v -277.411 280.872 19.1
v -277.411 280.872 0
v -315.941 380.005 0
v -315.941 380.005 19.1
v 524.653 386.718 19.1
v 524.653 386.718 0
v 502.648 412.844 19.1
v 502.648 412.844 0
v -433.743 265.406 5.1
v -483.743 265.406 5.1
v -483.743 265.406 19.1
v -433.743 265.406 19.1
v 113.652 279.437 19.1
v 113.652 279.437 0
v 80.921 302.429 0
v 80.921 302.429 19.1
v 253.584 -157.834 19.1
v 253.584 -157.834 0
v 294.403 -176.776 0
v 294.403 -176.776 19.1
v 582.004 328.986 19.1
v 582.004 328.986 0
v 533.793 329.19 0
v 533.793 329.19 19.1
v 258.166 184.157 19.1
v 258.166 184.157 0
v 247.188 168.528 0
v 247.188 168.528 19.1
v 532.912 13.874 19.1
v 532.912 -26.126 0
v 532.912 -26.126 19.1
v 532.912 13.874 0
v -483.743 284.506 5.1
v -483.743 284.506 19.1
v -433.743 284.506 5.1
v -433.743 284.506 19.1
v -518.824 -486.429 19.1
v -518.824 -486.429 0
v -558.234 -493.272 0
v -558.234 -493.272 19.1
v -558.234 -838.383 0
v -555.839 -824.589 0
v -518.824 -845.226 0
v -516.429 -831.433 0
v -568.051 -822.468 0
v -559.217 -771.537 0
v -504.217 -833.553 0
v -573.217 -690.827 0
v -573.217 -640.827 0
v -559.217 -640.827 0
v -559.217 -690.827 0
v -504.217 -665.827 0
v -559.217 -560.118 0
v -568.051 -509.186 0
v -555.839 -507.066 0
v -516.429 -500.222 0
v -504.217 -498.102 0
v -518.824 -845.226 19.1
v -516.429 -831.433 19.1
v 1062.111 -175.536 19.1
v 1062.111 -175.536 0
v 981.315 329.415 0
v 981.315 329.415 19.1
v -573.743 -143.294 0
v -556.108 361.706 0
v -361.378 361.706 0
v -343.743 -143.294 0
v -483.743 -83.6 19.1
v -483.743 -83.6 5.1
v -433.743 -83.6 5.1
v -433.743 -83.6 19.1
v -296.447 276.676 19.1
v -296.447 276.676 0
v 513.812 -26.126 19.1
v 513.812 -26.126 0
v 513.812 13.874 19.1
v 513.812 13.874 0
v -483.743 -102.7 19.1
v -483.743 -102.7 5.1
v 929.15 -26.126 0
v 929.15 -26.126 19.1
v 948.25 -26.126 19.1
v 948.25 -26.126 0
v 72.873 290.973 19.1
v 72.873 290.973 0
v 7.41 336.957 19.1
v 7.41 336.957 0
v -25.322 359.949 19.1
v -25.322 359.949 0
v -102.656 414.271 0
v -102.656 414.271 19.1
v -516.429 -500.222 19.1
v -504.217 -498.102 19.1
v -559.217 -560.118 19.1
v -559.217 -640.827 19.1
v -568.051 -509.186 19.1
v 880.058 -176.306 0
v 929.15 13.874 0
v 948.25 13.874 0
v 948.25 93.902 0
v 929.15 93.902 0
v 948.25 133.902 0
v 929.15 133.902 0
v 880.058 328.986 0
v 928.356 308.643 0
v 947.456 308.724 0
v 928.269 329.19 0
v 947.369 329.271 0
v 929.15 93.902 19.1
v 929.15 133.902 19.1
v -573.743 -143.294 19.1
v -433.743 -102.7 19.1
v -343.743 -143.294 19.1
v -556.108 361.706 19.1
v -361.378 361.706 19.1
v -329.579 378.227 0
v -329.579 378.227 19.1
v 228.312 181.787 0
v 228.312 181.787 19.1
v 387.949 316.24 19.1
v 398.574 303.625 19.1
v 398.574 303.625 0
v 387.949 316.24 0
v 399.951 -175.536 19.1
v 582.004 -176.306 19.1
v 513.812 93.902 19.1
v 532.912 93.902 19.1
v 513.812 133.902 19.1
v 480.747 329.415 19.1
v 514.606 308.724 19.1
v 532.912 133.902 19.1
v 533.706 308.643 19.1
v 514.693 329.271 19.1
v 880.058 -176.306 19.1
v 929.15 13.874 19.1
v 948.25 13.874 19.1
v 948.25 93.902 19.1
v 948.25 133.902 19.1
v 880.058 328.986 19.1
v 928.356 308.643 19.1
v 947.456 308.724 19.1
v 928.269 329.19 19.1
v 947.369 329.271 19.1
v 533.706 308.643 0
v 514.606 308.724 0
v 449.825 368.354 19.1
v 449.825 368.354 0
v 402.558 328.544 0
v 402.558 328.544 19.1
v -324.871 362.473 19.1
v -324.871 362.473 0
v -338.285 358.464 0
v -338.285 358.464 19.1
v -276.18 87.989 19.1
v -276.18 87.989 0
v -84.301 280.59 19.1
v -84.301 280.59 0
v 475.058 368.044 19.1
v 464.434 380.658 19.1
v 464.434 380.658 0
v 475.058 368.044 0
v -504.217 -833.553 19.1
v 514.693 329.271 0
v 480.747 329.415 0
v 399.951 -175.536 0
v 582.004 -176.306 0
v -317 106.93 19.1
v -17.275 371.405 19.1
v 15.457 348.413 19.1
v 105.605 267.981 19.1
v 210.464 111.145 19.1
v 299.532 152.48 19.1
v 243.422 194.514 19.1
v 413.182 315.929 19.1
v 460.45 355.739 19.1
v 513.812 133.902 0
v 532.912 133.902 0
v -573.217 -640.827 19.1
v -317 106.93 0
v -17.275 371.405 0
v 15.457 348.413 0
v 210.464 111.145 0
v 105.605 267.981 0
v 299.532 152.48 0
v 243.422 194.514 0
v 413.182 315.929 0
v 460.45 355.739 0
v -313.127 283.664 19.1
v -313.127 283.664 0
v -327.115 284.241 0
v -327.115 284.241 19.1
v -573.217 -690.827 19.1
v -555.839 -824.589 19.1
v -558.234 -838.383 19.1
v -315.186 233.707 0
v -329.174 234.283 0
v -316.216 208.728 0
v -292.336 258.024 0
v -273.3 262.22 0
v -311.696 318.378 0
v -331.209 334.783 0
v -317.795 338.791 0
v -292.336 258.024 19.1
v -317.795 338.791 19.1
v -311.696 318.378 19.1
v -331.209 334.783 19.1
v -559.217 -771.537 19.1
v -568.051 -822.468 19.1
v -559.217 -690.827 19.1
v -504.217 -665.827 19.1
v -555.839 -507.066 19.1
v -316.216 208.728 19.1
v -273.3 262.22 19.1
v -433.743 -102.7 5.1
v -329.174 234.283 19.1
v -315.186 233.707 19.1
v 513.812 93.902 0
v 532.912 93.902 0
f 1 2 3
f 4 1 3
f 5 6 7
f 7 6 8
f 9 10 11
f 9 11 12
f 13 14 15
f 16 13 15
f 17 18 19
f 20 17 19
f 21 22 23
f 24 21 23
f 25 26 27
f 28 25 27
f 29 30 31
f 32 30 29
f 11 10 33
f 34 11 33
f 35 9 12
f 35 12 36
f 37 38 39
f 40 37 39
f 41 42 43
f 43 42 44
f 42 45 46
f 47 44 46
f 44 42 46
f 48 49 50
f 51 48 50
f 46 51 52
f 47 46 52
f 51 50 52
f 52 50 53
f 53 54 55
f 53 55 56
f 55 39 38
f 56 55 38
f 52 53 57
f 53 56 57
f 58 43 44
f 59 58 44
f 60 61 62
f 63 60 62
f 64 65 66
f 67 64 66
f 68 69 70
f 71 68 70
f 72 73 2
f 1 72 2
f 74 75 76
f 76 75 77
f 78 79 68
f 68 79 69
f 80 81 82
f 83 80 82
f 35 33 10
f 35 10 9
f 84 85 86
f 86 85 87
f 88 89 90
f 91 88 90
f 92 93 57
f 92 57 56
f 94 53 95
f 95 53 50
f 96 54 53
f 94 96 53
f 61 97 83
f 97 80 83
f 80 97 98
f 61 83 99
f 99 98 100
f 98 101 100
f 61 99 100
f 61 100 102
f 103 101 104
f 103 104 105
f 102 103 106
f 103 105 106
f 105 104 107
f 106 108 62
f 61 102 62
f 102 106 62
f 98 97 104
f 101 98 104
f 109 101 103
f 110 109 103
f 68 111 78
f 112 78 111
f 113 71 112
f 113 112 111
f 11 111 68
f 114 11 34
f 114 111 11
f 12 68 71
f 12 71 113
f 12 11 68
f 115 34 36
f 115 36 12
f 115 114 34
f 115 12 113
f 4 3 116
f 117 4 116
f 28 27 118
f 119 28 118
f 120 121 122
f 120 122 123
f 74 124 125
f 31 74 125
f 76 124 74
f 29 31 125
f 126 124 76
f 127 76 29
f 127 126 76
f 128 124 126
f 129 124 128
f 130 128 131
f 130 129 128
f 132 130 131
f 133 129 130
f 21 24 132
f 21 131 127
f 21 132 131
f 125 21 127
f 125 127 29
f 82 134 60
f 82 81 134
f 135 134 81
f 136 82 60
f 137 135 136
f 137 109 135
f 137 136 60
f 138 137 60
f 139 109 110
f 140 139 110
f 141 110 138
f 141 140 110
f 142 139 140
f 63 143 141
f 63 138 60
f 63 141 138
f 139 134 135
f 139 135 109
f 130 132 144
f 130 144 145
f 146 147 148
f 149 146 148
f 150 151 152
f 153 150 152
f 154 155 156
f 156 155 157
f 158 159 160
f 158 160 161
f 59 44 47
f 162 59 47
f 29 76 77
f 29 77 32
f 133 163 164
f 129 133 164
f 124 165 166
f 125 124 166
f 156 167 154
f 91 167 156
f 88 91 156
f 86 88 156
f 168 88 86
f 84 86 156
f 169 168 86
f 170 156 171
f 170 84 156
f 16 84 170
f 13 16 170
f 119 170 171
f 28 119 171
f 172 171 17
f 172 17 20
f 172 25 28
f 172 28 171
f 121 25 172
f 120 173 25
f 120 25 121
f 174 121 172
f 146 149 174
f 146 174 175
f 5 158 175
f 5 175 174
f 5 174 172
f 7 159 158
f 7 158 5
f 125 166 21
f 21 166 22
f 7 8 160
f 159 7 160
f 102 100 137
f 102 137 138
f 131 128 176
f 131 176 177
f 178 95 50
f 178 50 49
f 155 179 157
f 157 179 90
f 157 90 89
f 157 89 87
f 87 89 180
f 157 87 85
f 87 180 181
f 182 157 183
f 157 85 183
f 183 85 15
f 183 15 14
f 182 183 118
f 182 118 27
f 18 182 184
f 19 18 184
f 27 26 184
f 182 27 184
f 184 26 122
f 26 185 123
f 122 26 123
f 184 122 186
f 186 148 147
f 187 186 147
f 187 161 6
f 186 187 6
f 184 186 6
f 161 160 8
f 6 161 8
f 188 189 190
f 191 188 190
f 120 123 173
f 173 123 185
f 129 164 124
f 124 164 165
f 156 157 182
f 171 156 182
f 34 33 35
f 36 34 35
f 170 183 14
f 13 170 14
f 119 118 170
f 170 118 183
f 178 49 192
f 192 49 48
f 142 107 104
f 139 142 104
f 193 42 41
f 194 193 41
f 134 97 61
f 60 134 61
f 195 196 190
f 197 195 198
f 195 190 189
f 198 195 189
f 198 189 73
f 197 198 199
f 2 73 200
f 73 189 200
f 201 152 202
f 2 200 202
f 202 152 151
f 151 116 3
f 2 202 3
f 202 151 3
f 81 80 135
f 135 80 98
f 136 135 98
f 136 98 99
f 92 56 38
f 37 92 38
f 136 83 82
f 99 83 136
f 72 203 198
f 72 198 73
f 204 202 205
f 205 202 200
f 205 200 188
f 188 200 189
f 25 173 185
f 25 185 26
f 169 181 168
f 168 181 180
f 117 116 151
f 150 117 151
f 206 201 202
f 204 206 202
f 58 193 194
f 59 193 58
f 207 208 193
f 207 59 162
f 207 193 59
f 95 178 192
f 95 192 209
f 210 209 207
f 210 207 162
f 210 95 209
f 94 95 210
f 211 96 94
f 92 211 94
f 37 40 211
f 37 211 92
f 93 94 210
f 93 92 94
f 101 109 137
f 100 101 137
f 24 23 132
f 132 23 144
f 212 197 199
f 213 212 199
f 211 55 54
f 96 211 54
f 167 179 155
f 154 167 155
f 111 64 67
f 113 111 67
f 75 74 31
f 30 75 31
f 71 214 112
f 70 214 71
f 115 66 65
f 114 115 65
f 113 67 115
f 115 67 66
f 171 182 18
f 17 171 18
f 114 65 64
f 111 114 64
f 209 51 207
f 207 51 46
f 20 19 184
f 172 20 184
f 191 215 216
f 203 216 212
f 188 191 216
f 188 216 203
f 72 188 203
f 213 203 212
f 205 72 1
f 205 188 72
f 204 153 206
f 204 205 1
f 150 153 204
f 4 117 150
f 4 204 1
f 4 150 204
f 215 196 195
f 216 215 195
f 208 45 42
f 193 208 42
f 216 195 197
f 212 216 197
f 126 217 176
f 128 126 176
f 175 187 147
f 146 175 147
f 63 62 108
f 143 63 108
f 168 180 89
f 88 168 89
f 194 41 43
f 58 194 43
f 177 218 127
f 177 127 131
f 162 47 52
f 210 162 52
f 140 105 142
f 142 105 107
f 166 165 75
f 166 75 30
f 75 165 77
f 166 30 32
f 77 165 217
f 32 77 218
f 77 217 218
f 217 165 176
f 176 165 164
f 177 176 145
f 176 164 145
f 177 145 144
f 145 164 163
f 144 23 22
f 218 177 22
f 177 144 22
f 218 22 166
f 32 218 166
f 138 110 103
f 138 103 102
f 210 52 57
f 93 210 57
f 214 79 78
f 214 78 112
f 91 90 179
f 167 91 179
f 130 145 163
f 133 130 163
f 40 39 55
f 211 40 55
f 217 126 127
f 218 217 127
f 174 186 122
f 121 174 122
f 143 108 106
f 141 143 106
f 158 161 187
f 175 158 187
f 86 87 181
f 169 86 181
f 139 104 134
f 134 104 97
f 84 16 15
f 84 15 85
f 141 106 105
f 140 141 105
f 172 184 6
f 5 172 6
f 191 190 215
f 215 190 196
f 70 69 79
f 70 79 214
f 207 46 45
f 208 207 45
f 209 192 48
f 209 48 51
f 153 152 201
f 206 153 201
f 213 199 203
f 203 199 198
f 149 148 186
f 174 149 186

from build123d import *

# Parameters (mm, degrees)
F8_DEPTH  = 19.1
F5_W      = 50
F5_H      = 19.1
F9_DEPTH  = 19.1
F10_DEPTH = 5.1
F7_W      = 19.1
F7_H      = 40
F11_DEPTH = 19.1
F12_DEPTH = 19.1
F13_DEPTH = 19.1
F14_DEPTH = 19.1


with BuildPart() as f8:
    # F4 (on Top) → F8 (new body)
    with BuildSketch(Plane.XY):
        Polygon((-313.1266277774, 283.6644104903), (-327.1147646324, 284.2410020329), (-329.1741094881, 234.2834420546), (-315.1859736966, 233.7068247119), (-316.2156467329, 208.7280299609), (-273.3003869716, 262.2195143856), (-292.3363522535, 258.0239884914), (-296.4473277028, 276.6763309864), (-277.4113714695, 280.8718979359), (-315.9410263327, 380.0053418764), (-329.5787654228, 378.2274162112), (-324.8712113565, 362.4725983647), (-338.2852128724, 358.4644823715), (-331.2090634127, 334.7826628481), (-317.7950618968, 338.7907788413), (-311.6956915548, 318.3779556716), align=None)
    extrude(amount=F8_DEPTH)


with BuildPart() as f9:
    # F5 (on Top) → F9 (new body)
    with BuildSketch(Plane.XY):
        Polygon((-361.3780457647, 361.7061713082), (-556.1080685776, 361.7061713082), (-573.7430571711, -143.2938286987), (-343.7430571711, -143.2938286987), align=None)
        with Locations((-458.7430571711, -93.149946513)):
            Rectangle(F5_W, F5_H, mode=Mode.SUBTRACT)
        with Locations((-458.7430571711, 274.9561713082)):
            Rectangle(F5_W, F5_H, mode=Mode.SUBTRACT)
    extrude(amount=F9_DEPTH)

    # F5 (on Top) → F10 (join)
    with BuildSketch(Plane.XY):
        with Locations((-458.7430571711, 274.9561713082)):
            Rectangle(F5_W, F5_H)
        with Locations((-458.7430571711, -93.149946513)):
            Rectangle(F5_W, F5_H)
    extrude(amount=F10_DEPTH)


with BuildPart() as f11:
    # F7 (on Top) → F11 (new body)
    with BuildSketch(Plane.XY):
        Polygon((582.0035287882, -176.3063819392), (582.0035287882, 328.9861993314), (533.7929346044, 329.1903235698), (533.7059359161, 308.6427468278), (514.6061071153, 308.7236157337), (514.6931058036, 329.2711924758), (480.7467333972, 329.4149218268), (399.951019882, -175.5355694162), align=None)
        with Locations((523.362160485, -6.1262955917)):
            Rectangle(F7_W, F7_H, mode=Mode.SUBTRACT)
        with Locations((523.362160485, 113.9023802395)):
            Rectangle(F7_W, F7_H, mode=Mode.SUBTRACT)
    extrude(amount=F11_DEPTH)


with BuildPart() as f12:
    # F7 (on Top) → F12 (new body)
    with BuildSketch(Plane.XY):
        Polygon((947.4556556945, 308.7236157337), (928.3558268936, 308.6427468278), (928.2688282054, 329.1903235698), (880.0582340215, 328.9861993314), (880.0582340215, -176.3063819392), (1062.1107429277, -175.5355694162), (981.3150294126, 329.4149218268), (947.3686570062, 329.2711924758), align=None)
        with Locations((938.6996023248, -6.1262955917)):
            Rectangle(F7_W, F7_H, mode=Mode.SUBTRACT)
        with Locations((938.6996023248, 113.9023802395)):
            Rectangle(F7_W, F7_H, mode=Mode.SUBTRACT)
    extrude(amount=F12_DEPTH)


with BuildPart() as f13:
    # F6 (on Top) → F13 (new body)
    with BuildSketch(Plane.XY):
        Polygon((-102.6559747542, 414.2710963537), (-316.9997298591, 106.9301511755), (-276.1802506404, 87.988923224), (-84.3006384796, 280.5902925922), (210.4639827755, 111.1448463205), (253.5838772676, -157.834475293), (294.4033564863, -176.7757032445), (299.5322804337, 152.4799536751), (524.6525175935, 386.7178821382), (502.648378277, 412.8437198576), (464.4339913585, 380.6581607692), (475.0584816431, 368.0435474443), (460.4496238611, 355.7394312914), (449.8251335765, 368.3540446163), (402.5579608011, 328.5438970522), (413.1824510857, 315.9292837272), (398.5735933037, 303.6251675743), (387.9491030191, 316.2397808993), (243.4223633701, 194.5140567959), (258.1663649741, 184.1573221161), (247.1876840831, 168.5279086309), (228.3115703971, 181.7871924047), (105.6050950916, 267.9807809809), (113.6522957447, 279.4368955775), (80.9205397546, 302.4288974434), (72.8733391015, 290.9727828469), (7.4098271213, 336.9567865788), (15.4570277744, 348.4129011753), (-17.2747282158, 371.4049030412), (-25.3219288688, 359.9487884447), align=None)
    extrude(amount=F13_DEPTH)


with BuildPart() as f14:
    # F2 (on Top) → F14 (new body)
    with BuildSketch(Plane.XY):
        Polygon((-559.2167156932, -771.5370085048), (-568.0514116688, -822.4683943254), (-555.8391791674, -824.5890262445), (-558.2344093439, -838.3826070849), (-518.8241783712, -845.2261218748), (-516.4289481947, -831.4325410344), (-504.2167156934, -833.5531729535), (-504.216715693, -665.8273935318), (-504.2167156934, -498.1016141101), (-516.4289481947, -500.2222460292), (-518.8241783712, -486.4286651888), (-558.2344093439, -493.2721799787), (-555.8391791674, -507.0657608191), (-568.0514116688, -509.1863927382), (-559.2167156932, -560.1177785588), (-559.216715693, -640.8273935318), (-573.216715693, -640.8273935318), (-573.216715693, -665.8273935318), (-573.216715693, -690.8273935318), (-559.216715693, -690.8273935318), align=None)
    extrude(amount=F14_DEPTH)


solid = Compound([f8.part, f9.part, f11.part, f12.part, f13.part, f14.part])
